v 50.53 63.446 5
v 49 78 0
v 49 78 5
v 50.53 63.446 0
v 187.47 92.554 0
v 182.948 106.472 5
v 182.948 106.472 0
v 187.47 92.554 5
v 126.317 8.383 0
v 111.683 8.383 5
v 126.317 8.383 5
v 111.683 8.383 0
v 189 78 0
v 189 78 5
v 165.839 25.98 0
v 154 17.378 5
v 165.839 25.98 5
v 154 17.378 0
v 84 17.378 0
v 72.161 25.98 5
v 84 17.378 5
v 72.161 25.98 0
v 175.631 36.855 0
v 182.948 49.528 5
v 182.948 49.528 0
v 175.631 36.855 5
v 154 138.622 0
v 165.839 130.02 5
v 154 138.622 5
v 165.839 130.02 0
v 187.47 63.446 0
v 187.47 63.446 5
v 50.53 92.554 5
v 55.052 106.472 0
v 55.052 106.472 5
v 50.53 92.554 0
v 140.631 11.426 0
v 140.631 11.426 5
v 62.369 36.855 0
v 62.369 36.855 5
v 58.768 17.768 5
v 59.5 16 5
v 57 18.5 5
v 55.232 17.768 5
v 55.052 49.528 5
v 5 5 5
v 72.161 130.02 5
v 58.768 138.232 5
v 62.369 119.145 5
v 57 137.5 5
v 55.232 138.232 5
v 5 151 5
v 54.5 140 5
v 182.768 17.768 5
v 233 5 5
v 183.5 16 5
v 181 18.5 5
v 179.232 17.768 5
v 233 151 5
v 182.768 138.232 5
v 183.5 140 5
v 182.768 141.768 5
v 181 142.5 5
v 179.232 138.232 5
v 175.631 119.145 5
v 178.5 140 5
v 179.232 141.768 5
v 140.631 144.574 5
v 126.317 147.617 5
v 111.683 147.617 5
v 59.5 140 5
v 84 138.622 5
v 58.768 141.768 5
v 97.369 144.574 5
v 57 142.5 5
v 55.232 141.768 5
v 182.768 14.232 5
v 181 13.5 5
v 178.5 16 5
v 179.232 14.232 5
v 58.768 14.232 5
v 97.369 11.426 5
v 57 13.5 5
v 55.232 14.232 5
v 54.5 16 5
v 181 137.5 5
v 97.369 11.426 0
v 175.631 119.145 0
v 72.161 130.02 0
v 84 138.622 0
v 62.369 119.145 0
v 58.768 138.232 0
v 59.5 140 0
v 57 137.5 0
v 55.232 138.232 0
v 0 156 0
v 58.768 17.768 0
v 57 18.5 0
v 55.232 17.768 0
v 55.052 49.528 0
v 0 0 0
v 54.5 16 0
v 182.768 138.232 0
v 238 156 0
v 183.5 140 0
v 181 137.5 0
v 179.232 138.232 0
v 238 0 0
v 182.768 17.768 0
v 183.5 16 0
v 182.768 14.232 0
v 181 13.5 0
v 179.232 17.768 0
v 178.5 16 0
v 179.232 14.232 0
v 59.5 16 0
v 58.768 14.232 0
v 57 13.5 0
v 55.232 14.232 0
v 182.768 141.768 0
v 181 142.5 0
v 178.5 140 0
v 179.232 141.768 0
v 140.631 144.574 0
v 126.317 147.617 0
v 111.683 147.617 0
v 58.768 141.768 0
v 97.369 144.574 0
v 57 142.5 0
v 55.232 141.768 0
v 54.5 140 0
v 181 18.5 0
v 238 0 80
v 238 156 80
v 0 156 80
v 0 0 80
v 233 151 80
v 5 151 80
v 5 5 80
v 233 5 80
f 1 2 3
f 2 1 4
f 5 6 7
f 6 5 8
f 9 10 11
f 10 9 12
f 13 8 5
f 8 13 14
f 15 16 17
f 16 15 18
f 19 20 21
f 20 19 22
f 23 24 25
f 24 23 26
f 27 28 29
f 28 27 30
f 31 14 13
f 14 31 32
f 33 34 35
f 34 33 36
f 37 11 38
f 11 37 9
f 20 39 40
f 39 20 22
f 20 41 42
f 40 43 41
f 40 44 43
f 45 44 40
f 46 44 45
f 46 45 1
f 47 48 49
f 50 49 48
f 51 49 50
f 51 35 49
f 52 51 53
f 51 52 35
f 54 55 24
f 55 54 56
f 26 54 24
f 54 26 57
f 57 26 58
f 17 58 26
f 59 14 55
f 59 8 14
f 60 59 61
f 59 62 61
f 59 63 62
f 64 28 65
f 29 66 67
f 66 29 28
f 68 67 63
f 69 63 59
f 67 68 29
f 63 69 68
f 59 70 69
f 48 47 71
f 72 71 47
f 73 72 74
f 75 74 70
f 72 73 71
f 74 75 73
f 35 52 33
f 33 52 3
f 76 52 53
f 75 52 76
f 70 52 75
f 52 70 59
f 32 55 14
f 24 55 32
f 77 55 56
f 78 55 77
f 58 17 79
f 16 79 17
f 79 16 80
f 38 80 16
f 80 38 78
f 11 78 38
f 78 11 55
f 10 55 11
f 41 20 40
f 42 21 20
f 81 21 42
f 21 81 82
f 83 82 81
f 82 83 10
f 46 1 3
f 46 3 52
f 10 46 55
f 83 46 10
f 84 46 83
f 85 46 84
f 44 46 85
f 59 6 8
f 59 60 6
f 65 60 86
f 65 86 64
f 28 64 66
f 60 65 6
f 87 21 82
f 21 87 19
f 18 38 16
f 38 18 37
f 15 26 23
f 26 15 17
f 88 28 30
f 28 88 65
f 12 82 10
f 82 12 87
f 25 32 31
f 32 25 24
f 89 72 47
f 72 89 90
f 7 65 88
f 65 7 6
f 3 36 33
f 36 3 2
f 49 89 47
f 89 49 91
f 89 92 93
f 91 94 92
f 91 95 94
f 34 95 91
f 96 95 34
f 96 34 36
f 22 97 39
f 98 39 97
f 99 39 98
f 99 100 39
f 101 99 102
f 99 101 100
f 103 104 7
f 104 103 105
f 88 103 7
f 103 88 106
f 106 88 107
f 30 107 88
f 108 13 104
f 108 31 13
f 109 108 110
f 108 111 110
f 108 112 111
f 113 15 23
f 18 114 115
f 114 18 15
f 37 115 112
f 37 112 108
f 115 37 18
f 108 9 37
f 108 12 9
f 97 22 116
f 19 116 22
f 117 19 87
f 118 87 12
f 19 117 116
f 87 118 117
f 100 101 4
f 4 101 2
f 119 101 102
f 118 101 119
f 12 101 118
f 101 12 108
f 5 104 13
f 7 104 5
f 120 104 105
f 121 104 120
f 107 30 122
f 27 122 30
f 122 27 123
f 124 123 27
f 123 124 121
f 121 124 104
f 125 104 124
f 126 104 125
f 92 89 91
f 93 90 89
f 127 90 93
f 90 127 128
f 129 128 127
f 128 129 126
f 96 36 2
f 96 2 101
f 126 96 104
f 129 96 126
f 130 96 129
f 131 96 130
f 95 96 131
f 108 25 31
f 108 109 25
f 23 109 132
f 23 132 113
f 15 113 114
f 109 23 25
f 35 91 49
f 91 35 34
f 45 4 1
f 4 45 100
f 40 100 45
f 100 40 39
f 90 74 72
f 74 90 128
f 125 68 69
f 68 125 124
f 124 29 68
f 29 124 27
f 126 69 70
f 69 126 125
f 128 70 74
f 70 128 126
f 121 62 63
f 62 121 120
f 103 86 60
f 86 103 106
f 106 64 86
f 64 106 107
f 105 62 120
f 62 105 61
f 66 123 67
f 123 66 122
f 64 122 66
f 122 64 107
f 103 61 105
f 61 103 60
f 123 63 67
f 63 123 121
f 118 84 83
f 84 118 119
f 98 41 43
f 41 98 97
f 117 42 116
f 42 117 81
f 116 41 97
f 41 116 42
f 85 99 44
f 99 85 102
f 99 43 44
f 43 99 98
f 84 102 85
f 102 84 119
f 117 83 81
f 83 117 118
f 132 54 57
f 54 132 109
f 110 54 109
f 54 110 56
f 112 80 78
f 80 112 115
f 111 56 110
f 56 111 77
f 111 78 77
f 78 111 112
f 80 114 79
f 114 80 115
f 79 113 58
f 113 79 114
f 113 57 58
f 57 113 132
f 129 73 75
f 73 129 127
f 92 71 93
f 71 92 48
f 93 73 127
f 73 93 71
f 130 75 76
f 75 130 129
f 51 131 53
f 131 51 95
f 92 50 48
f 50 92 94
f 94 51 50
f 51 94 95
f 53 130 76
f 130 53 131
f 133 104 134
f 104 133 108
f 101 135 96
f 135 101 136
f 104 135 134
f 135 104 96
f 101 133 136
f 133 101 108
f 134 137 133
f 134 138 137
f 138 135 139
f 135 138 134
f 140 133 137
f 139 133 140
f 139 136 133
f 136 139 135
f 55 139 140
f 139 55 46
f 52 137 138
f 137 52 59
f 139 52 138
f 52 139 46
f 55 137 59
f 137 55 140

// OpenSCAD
back_length = 238;
back_width = 156;
depth = 5;
top_length = 80;
screw_radius = 2.5;
distance_to_middle_of_circle_x = 62;
distance_to_middle_of_circle_y = 62;

// the back
difference() {
  cube([back_length, back_width, depth]);

  translate([back_length / 2, back_width / 2, 0]) {
    linear_extrude(height=5) color([256, 0, 0]) circle(70);
    translate([distance_to_middle_of_circle_x, distance_to_middle_of_circle_y, 0]) {
      linear_extrude(height=depth) circle(screw_radius);
    }

    translate([-distance_to_middle_of_circle_x, -distance_to_middle_of_circle_y, 0]) {
      linear_extrude(height=depth) circle(screw_radius);
    }

    translate([-distance_to_middle_of_circle_x, -distance_to_middle_of_circle_y, 0]) {
      linear_extrude(height=depth) circle(screw_radius);
    }

    translate([distance_to_middle_of_circle_x, -distance_to_middle_of_circle_y, 0]) {
      linear_extrude(height=depth) circle(screw_radius);
    }

    translate([-distance_to_middle_of_circle_x, distance_to_middle_of_circle_y, 0]) {
      linear_extrude(height=depth) circle(screw_radius);
    }
  }
}

// the top
cube([back_length, depth, top_length]);

// the bottom
translate([0, back_width - depth, 0]) {
  cube([back_length, depth, top_length]);
}

// the left
cube([depth, back_width, top_length]);

// the right
translate([back_length - depth, 0, 0]) {
  cube([depth, back_width, top_length]);
}
